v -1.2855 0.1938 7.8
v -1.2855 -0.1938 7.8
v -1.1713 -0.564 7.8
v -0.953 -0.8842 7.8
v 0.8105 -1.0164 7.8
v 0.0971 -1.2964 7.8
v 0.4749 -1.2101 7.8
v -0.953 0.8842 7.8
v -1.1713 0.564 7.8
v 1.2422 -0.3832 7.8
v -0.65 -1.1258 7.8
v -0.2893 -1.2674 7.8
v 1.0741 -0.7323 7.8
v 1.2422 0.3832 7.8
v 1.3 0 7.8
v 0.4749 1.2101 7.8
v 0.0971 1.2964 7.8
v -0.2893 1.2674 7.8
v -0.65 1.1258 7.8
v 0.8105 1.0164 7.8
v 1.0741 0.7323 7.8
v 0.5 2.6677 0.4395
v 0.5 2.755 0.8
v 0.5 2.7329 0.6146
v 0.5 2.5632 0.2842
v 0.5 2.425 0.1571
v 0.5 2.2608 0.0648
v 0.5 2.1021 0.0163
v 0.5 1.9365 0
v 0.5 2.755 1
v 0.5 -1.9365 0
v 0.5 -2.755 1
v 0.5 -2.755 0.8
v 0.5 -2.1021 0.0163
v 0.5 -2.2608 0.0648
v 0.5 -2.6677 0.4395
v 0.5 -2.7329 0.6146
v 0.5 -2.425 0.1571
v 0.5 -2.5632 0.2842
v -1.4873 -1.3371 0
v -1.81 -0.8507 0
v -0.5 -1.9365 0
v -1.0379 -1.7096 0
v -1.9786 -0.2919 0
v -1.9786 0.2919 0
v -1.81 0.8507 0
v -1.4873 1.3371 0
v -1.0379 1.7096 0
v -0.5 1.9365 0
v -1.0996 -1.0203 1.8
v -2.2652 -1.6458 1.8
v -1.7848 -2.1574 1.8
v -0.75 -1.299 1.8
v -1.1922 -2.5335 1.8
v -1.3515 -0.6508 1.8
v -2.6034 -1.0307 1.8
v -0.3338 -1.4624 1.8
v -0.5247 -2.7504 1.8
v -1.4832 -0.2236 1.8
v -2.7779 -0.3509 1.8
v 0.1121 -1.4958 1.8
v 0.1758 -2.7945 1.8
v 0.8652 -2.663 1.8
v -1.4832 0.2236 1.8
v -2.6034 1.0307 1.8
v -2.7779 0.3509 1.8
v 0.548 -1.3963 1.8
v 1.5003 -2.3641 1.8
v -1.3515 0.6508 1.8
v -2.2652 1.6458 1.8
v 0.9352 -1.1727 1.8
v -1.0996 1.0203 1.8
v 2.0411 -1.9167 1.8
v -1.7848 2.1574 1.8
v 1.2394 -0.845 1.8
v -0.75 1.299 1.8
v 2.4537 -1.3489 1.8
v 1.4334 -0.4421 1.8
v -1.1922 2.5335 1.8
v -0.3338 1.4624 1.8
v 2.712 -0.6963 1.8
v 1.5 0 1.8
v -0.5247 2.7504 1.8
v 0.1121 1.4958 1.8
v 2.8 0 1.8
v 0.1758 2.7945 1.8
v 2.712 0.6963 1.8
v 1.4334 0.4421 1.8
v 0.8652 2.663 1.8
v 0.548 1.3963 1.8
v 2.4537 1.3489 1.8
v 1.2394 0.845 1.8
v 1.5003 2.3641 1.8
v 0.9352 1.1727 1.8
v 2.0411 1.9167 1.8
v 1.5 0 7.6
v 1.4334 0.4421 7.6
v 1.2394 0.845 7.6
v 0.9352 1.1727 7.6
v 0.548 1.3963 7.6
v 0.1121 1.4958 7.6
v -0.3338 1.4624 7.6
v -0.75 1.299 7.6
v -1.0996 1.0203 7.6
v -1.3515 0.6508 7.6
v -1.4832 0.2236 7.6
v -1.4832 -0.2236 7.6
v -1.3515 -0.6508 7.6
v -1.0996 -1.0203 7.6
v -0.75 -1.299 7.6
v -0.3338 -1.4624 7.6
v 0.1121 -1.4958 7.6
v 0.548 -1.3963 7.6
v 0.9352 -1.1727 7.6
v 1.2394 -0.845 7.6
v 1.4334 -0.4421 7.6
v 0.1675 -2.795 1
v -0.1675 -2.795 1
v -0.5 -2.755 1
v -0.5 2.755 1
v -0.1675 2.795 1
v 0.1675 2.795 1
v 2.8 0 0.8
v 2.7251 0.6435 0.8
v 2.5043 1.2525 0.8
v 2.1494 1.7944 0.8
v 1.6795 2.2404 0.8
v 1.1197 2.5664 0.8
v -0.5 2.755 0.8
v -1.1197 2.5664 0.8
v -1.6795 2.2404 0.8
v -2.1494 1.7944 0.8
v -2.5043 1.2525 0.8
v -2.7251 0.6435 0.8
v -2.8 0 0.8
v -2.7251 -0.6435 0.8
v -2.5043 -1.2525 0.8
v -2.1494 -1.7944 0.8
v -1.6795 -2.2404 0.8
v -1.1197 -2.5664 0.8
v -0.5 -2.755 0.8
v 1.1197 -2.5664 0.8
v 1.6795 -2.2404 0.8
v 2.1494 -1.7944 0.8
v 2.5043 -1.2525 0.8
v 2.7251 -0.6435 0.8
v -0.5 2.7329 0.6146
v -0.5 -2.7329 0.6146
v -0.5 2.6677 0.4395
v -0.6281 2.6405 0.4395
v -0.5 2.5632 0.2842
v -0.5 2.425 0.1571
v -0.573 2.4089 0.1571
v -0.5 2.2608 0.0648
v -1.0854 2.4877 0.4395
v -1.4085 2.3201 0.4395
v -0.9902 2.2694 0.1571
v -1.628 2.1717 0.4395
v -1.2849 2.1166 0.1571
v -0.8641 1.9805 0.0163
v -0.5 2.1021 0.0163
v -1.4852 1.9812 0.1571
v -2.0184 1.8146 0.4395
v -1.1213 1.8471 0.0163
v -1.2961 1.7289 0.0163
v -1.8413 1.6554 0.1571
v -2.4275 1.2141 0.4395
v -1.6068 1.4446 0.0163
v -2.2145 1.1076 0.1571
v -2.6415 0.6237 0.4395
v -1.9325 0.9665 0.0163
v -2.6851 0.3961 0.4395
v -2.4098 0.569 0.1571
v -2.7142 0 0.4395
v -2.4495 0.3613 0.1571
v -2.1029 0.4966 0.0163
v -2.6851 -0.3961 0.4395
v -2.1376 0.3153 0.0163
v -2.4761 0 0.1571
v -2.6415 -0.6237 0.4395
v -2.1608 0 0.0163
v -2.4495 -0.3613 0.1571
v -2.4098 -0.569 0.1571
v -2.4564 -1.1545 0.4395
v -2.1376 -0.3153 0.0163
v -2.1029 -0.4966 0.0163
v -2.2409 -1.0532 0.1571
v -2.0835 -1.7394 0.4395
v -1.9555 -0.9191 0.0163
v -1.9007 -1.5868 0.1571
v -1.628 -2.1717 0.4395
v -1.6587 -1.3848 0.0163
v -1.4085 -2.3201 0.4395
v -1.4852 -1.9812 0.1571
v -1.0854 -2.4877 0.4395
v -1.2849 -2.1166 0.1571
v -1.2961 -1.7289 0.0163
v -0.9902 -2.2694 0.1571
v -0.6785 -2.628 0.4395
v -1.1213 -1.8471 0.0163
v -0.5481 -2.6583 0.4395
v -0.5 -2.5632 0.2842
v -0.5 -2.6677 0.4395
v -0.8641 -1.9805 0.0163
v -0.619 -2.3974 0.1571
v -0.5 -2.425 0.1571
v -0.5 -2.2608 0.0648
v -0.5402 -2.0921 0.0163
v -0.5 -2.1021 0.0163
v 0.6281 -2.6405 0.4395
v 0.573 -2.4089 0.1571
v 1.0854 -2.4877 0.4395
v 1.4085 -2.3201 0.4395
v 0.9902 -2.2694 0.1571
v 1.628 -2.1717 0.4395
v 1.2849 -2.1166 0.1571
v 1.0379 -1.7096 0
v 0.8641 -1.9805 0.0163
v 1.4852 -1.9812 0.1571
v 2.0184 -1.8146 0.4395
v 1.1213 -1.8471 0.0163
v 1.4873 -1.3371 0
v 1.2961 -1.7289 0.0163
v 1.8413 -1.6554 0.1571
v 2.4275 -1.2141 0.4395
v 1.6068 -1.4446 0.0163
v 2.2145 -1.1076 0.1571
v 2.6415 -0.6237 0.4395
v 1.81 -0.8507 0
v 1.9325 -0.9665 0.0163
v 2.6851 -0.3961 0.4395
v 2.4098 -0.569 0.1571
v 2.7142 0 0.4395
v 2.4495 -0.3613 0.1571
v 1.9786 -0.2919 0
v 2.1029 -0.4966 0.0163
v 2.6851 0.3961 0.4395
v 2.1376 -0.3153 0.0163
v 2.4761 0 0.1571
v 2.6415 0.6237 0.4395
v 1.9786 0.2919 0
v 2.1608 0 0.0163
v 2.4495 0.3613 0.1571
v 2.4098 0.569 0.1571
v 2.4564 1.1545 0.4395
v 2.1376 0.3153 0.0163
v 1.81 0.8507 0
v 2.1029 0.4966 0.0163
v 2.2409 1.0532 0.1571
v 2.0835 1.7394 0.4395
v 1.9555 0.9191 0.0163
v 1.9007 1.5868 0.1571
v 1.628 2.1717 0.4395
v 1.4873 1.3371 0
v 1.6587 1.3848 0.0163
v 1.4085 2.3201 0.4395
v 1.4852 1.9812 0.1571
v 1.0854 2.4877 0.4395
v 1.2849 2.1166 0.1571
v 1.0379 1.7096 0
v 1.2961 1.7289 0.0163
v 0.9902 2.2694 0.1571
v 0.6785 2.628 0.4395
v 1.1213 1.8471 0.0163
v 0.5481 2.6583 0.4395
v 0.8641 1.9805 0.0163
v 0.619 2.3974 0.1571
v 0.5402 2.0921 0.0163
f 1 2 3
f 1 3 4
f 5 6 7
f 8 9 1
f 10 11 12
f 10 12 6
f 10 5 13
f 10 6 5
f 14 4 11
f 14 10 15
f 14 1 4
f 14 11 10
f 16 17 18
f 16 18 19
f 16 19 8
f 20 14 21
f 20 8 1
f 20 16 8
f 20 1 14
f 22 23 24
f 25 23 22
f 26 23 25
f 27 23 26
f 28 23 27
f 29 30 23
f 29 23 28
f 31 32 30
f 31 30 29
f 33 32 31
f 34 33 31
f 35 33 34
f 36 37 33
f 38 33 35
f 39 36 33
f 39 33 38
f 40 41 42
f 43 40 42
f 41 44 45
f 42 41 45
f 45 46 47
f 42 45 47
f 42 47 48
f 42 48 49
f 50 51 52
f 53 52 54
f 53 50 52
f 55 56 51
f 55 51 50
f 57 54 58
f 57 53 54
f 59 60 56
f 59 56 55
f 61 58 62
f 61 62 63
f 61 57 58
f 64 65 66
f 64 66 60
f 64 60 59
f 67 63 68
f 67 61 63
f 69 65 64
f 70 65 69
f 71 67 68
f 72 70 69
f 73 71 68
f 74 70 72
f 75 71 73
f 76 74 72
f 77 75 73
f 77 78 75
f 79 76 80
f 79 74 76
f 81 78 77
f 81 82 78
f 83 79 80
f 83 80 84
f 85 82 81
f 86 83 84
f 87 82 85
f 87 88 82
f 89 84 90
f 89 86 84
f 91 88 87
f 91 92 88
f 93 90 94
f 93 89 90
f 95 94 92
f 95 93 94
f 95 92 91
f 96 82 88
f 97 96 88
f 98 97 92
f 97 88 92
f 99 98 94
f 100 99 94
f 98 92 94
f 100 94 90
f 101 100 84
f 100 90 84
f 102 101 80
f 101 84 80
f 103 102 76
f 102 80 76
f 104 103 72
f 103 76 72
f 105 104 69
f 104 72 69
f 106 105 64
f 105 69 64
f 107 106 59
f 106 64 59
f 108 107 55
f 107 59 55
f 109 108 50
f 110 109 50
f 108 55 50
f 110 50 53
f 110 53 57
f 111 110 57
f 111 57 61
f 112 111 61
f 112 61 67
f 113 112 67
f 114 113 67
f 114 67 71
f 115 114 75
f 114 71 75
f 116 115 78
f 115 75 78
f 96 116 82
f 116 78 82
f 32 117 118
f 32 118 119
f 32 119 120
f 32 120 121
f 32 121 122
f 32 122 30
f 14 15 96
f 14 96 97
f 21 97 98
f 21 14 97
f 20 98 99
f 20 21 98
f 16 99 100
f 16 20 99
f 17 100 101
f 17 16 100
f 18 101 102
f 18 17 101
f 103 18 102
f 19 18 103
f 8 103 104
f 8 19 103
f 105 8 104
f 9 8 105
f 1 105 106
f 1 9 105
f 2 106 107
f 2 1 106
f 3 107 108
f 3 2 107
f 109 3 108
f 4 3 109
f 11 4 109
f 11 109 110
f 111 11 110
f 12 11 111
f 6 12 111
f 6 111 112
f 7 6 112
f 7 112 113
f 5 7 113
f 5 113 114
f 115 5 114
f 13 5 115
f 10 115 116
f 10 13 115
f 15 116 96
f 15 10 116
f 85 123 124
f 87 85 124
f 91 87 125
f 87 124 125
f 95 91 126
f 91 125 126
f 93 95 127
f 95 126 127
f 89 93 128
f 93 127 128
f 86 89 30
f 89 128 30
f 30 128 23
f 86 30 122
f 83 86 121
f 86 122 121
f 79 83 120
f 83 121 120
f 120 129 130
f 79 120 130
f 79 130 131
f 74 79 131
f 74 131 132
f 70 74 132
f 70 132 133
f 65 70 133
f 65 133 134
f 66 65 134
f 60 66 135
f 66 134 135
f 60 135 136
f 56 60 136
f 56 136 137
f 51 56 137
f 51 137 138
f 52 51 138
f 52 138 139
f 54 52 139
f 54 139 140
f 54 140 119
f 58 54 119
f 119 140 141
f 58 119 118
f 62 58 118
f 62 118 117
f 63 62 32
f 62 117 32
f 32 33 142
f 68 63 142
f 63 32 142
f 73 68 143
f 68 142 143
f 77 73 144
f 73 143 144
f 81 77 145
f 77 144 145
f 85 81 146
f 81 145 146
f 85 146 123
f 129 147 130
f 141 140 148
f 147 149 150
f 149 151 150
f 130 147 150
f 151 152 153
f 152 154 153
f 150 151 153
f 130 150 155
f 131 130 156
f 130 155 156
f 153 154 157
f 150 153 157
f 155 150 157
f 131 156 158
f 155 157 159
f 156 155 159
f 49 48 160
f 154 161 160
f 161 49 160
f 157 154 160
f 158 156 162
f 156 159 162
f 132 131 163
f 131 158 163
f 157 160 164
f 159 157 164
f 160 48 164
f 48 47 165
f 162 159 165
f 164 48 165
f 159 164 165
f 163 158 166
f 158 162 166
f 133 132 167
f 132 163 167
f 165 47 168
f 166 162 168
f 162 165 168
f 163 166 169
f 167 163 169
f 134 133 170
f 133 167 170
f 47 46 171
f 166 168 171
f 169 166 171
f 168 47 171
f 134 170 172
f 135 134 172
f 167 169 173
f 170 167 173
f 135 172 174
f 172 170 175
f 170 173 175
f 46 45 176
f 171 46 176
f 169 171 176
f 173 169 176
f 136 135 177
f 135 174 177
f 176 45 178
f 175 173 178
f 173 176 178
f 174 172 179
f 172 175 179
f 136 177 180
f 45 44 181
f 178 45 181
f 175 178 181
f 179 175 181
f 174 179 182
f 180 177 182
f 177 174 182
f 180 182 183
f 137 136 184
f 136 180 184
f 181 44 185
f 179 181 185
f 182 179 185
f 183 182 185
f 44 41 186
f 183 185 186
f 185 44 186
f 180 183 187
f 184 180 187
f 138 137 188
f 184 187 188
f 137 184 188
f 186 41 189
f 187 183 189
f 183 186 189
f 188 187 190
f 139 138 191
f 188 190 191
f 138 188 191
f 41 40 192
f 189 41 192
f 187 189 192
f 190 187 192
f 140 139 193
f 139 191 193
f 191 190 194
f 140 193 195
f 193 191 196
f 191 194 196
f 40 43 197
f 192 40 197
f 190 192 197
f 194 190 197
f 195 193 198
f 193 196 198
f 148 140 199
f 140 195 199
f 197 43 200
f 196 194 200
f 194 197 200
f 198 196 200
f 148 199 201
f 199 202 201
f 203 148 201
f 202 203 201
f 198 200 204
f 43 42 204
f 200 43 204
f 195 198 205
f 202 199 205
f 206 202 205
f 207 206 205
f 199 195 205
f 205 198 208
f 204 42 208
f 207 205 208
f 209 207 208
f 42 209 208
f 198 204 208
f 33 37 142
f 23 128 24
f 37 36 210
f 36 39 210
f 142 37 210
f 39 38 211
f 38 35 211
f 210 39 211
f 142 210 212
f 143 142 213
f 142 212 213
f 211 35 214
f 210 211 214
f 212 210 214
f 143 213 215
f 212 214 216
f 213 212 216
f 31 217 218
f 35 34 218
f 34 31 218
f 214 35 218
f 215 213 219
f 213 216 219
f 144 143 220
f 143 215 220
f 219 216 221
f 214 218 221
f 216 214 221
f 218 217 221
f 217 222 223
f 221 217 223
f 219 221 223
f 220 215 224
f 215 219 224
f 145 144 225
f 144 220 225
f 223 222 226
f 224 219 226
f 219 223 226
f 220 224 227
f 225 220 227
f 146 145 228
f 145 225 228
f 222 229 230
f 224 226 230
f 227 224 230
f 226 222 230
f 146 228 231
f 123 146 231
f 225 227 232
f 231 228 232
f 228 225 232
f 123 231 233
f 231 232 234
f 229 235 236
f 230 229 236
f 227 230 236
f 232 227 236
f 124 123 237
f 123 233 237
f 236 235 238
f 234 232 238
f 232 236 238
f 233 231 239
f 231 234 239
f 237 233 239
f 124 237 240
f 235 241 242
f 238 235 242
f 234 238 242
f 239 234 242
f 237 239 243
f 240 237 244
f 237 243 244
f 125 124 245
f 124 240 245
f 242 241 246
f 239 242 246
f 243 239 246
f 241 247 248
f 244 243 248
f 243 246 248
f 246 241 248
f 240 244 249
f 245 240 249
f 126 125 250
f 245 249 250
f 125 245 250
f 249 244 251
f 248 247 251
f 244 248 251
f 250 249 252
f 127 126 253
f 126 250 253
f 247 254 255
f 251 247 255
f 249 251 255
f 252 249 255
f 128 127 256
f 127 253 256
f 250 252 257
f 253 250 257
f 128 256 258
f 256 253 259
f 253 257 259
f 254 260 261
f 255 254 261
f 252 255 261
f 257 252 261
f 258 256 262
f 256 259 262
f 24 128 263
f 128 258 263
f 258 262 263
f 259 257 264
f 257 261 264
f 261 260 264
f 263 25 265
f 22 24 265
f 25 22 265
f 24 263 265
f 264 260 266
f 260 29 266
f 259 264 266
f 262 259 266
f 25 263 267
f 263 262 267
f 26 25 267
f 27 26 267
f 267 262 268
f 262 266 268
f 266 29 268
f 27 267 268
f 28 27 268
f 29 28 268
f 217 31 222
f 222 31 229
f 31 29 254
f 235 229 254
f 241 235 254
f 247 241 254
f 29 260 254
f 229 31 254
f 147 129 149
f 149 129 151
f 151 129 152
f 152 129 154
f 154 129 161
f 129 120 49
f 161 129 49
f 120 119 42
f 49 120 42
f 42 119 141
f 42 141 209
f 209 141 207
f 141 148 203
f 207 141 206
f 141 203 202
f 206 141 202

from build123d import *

# Parameters (mm, degrees)
ESQUISSE1_R                  = 2.8
BASE_EXTRUSION_DEPTH         = 1.8
CONG_1_R                     = 0.8
ESQUISSE2_R                  = 1.5
BOSS_EXTRU_1_DEPTH           = 6
CHANFREIN1_SIZE              = 0.2
ESQUISSE3_W                  = 1
ESQUISSE3_H                  = 1
ENL_V_MAT_EXTRU_1_DEPTH      = 3.8000001
ENL_V_MAT_EXTRU_1_DEPTH_BACK = 3.8


with BuildPart() as part:
    # Esquisse1 → Base-Extrusion (new body)
    with BuildSketch(Plane.XY):
        Circle(ESQUISSE1_R)
    extrude(amount=BASE_EXTRUSION_DEPTH)

    # Cong_1
    cong_1_edges = [part.edges().sort_by_distance(p)[0] for p in [
        (-2.8, 0, 0),
    ]]
    fillet(cong_1_edges, radius=CONG_1_R)

    # Esquisse2 → Boss.-Extru.1 (add)
    with BuildSketch(Plane.XY.offset(1.8)):
        Circle(ESQUISSE2_R)
    extrude(amount=BOSS_EXTRU_1_DEPTH)

    # Chanfrein1
    chanfrein1_edges = [part.edges().sort_by_distance(p)[0] for p in [
        (-1.5, 0, 7.8),
    ]]
    chamfer(chanfrein1_edges, length=CHANFREIN1_SIZE)

    # Esquisse3 → Enl_v. mat.-Extru.1 (cut, two sides)
    with BuildSketch(Plane(origin=(0, 0, 0), x_dir=(1, 0, 0), z_dir=(0, 1, 0))) as enl_v_mat_extru_1_sk:
        with Locations((0, -0.5)):
            Rectangle(ESQUISSE3_W, ESQUISSE3_H)
    extrude(amount=ENL_V_MAT_EXTRU_1_DEPTH, mode=Mode.SUBTRACT)
    extrude(enl_v_mat_extru_1_sk.sketch, amount=-ENL_V_MAT_EXTRU_1_DEPTH_BACK, mode=Mode.SUBTRACT)


solid = part.part
